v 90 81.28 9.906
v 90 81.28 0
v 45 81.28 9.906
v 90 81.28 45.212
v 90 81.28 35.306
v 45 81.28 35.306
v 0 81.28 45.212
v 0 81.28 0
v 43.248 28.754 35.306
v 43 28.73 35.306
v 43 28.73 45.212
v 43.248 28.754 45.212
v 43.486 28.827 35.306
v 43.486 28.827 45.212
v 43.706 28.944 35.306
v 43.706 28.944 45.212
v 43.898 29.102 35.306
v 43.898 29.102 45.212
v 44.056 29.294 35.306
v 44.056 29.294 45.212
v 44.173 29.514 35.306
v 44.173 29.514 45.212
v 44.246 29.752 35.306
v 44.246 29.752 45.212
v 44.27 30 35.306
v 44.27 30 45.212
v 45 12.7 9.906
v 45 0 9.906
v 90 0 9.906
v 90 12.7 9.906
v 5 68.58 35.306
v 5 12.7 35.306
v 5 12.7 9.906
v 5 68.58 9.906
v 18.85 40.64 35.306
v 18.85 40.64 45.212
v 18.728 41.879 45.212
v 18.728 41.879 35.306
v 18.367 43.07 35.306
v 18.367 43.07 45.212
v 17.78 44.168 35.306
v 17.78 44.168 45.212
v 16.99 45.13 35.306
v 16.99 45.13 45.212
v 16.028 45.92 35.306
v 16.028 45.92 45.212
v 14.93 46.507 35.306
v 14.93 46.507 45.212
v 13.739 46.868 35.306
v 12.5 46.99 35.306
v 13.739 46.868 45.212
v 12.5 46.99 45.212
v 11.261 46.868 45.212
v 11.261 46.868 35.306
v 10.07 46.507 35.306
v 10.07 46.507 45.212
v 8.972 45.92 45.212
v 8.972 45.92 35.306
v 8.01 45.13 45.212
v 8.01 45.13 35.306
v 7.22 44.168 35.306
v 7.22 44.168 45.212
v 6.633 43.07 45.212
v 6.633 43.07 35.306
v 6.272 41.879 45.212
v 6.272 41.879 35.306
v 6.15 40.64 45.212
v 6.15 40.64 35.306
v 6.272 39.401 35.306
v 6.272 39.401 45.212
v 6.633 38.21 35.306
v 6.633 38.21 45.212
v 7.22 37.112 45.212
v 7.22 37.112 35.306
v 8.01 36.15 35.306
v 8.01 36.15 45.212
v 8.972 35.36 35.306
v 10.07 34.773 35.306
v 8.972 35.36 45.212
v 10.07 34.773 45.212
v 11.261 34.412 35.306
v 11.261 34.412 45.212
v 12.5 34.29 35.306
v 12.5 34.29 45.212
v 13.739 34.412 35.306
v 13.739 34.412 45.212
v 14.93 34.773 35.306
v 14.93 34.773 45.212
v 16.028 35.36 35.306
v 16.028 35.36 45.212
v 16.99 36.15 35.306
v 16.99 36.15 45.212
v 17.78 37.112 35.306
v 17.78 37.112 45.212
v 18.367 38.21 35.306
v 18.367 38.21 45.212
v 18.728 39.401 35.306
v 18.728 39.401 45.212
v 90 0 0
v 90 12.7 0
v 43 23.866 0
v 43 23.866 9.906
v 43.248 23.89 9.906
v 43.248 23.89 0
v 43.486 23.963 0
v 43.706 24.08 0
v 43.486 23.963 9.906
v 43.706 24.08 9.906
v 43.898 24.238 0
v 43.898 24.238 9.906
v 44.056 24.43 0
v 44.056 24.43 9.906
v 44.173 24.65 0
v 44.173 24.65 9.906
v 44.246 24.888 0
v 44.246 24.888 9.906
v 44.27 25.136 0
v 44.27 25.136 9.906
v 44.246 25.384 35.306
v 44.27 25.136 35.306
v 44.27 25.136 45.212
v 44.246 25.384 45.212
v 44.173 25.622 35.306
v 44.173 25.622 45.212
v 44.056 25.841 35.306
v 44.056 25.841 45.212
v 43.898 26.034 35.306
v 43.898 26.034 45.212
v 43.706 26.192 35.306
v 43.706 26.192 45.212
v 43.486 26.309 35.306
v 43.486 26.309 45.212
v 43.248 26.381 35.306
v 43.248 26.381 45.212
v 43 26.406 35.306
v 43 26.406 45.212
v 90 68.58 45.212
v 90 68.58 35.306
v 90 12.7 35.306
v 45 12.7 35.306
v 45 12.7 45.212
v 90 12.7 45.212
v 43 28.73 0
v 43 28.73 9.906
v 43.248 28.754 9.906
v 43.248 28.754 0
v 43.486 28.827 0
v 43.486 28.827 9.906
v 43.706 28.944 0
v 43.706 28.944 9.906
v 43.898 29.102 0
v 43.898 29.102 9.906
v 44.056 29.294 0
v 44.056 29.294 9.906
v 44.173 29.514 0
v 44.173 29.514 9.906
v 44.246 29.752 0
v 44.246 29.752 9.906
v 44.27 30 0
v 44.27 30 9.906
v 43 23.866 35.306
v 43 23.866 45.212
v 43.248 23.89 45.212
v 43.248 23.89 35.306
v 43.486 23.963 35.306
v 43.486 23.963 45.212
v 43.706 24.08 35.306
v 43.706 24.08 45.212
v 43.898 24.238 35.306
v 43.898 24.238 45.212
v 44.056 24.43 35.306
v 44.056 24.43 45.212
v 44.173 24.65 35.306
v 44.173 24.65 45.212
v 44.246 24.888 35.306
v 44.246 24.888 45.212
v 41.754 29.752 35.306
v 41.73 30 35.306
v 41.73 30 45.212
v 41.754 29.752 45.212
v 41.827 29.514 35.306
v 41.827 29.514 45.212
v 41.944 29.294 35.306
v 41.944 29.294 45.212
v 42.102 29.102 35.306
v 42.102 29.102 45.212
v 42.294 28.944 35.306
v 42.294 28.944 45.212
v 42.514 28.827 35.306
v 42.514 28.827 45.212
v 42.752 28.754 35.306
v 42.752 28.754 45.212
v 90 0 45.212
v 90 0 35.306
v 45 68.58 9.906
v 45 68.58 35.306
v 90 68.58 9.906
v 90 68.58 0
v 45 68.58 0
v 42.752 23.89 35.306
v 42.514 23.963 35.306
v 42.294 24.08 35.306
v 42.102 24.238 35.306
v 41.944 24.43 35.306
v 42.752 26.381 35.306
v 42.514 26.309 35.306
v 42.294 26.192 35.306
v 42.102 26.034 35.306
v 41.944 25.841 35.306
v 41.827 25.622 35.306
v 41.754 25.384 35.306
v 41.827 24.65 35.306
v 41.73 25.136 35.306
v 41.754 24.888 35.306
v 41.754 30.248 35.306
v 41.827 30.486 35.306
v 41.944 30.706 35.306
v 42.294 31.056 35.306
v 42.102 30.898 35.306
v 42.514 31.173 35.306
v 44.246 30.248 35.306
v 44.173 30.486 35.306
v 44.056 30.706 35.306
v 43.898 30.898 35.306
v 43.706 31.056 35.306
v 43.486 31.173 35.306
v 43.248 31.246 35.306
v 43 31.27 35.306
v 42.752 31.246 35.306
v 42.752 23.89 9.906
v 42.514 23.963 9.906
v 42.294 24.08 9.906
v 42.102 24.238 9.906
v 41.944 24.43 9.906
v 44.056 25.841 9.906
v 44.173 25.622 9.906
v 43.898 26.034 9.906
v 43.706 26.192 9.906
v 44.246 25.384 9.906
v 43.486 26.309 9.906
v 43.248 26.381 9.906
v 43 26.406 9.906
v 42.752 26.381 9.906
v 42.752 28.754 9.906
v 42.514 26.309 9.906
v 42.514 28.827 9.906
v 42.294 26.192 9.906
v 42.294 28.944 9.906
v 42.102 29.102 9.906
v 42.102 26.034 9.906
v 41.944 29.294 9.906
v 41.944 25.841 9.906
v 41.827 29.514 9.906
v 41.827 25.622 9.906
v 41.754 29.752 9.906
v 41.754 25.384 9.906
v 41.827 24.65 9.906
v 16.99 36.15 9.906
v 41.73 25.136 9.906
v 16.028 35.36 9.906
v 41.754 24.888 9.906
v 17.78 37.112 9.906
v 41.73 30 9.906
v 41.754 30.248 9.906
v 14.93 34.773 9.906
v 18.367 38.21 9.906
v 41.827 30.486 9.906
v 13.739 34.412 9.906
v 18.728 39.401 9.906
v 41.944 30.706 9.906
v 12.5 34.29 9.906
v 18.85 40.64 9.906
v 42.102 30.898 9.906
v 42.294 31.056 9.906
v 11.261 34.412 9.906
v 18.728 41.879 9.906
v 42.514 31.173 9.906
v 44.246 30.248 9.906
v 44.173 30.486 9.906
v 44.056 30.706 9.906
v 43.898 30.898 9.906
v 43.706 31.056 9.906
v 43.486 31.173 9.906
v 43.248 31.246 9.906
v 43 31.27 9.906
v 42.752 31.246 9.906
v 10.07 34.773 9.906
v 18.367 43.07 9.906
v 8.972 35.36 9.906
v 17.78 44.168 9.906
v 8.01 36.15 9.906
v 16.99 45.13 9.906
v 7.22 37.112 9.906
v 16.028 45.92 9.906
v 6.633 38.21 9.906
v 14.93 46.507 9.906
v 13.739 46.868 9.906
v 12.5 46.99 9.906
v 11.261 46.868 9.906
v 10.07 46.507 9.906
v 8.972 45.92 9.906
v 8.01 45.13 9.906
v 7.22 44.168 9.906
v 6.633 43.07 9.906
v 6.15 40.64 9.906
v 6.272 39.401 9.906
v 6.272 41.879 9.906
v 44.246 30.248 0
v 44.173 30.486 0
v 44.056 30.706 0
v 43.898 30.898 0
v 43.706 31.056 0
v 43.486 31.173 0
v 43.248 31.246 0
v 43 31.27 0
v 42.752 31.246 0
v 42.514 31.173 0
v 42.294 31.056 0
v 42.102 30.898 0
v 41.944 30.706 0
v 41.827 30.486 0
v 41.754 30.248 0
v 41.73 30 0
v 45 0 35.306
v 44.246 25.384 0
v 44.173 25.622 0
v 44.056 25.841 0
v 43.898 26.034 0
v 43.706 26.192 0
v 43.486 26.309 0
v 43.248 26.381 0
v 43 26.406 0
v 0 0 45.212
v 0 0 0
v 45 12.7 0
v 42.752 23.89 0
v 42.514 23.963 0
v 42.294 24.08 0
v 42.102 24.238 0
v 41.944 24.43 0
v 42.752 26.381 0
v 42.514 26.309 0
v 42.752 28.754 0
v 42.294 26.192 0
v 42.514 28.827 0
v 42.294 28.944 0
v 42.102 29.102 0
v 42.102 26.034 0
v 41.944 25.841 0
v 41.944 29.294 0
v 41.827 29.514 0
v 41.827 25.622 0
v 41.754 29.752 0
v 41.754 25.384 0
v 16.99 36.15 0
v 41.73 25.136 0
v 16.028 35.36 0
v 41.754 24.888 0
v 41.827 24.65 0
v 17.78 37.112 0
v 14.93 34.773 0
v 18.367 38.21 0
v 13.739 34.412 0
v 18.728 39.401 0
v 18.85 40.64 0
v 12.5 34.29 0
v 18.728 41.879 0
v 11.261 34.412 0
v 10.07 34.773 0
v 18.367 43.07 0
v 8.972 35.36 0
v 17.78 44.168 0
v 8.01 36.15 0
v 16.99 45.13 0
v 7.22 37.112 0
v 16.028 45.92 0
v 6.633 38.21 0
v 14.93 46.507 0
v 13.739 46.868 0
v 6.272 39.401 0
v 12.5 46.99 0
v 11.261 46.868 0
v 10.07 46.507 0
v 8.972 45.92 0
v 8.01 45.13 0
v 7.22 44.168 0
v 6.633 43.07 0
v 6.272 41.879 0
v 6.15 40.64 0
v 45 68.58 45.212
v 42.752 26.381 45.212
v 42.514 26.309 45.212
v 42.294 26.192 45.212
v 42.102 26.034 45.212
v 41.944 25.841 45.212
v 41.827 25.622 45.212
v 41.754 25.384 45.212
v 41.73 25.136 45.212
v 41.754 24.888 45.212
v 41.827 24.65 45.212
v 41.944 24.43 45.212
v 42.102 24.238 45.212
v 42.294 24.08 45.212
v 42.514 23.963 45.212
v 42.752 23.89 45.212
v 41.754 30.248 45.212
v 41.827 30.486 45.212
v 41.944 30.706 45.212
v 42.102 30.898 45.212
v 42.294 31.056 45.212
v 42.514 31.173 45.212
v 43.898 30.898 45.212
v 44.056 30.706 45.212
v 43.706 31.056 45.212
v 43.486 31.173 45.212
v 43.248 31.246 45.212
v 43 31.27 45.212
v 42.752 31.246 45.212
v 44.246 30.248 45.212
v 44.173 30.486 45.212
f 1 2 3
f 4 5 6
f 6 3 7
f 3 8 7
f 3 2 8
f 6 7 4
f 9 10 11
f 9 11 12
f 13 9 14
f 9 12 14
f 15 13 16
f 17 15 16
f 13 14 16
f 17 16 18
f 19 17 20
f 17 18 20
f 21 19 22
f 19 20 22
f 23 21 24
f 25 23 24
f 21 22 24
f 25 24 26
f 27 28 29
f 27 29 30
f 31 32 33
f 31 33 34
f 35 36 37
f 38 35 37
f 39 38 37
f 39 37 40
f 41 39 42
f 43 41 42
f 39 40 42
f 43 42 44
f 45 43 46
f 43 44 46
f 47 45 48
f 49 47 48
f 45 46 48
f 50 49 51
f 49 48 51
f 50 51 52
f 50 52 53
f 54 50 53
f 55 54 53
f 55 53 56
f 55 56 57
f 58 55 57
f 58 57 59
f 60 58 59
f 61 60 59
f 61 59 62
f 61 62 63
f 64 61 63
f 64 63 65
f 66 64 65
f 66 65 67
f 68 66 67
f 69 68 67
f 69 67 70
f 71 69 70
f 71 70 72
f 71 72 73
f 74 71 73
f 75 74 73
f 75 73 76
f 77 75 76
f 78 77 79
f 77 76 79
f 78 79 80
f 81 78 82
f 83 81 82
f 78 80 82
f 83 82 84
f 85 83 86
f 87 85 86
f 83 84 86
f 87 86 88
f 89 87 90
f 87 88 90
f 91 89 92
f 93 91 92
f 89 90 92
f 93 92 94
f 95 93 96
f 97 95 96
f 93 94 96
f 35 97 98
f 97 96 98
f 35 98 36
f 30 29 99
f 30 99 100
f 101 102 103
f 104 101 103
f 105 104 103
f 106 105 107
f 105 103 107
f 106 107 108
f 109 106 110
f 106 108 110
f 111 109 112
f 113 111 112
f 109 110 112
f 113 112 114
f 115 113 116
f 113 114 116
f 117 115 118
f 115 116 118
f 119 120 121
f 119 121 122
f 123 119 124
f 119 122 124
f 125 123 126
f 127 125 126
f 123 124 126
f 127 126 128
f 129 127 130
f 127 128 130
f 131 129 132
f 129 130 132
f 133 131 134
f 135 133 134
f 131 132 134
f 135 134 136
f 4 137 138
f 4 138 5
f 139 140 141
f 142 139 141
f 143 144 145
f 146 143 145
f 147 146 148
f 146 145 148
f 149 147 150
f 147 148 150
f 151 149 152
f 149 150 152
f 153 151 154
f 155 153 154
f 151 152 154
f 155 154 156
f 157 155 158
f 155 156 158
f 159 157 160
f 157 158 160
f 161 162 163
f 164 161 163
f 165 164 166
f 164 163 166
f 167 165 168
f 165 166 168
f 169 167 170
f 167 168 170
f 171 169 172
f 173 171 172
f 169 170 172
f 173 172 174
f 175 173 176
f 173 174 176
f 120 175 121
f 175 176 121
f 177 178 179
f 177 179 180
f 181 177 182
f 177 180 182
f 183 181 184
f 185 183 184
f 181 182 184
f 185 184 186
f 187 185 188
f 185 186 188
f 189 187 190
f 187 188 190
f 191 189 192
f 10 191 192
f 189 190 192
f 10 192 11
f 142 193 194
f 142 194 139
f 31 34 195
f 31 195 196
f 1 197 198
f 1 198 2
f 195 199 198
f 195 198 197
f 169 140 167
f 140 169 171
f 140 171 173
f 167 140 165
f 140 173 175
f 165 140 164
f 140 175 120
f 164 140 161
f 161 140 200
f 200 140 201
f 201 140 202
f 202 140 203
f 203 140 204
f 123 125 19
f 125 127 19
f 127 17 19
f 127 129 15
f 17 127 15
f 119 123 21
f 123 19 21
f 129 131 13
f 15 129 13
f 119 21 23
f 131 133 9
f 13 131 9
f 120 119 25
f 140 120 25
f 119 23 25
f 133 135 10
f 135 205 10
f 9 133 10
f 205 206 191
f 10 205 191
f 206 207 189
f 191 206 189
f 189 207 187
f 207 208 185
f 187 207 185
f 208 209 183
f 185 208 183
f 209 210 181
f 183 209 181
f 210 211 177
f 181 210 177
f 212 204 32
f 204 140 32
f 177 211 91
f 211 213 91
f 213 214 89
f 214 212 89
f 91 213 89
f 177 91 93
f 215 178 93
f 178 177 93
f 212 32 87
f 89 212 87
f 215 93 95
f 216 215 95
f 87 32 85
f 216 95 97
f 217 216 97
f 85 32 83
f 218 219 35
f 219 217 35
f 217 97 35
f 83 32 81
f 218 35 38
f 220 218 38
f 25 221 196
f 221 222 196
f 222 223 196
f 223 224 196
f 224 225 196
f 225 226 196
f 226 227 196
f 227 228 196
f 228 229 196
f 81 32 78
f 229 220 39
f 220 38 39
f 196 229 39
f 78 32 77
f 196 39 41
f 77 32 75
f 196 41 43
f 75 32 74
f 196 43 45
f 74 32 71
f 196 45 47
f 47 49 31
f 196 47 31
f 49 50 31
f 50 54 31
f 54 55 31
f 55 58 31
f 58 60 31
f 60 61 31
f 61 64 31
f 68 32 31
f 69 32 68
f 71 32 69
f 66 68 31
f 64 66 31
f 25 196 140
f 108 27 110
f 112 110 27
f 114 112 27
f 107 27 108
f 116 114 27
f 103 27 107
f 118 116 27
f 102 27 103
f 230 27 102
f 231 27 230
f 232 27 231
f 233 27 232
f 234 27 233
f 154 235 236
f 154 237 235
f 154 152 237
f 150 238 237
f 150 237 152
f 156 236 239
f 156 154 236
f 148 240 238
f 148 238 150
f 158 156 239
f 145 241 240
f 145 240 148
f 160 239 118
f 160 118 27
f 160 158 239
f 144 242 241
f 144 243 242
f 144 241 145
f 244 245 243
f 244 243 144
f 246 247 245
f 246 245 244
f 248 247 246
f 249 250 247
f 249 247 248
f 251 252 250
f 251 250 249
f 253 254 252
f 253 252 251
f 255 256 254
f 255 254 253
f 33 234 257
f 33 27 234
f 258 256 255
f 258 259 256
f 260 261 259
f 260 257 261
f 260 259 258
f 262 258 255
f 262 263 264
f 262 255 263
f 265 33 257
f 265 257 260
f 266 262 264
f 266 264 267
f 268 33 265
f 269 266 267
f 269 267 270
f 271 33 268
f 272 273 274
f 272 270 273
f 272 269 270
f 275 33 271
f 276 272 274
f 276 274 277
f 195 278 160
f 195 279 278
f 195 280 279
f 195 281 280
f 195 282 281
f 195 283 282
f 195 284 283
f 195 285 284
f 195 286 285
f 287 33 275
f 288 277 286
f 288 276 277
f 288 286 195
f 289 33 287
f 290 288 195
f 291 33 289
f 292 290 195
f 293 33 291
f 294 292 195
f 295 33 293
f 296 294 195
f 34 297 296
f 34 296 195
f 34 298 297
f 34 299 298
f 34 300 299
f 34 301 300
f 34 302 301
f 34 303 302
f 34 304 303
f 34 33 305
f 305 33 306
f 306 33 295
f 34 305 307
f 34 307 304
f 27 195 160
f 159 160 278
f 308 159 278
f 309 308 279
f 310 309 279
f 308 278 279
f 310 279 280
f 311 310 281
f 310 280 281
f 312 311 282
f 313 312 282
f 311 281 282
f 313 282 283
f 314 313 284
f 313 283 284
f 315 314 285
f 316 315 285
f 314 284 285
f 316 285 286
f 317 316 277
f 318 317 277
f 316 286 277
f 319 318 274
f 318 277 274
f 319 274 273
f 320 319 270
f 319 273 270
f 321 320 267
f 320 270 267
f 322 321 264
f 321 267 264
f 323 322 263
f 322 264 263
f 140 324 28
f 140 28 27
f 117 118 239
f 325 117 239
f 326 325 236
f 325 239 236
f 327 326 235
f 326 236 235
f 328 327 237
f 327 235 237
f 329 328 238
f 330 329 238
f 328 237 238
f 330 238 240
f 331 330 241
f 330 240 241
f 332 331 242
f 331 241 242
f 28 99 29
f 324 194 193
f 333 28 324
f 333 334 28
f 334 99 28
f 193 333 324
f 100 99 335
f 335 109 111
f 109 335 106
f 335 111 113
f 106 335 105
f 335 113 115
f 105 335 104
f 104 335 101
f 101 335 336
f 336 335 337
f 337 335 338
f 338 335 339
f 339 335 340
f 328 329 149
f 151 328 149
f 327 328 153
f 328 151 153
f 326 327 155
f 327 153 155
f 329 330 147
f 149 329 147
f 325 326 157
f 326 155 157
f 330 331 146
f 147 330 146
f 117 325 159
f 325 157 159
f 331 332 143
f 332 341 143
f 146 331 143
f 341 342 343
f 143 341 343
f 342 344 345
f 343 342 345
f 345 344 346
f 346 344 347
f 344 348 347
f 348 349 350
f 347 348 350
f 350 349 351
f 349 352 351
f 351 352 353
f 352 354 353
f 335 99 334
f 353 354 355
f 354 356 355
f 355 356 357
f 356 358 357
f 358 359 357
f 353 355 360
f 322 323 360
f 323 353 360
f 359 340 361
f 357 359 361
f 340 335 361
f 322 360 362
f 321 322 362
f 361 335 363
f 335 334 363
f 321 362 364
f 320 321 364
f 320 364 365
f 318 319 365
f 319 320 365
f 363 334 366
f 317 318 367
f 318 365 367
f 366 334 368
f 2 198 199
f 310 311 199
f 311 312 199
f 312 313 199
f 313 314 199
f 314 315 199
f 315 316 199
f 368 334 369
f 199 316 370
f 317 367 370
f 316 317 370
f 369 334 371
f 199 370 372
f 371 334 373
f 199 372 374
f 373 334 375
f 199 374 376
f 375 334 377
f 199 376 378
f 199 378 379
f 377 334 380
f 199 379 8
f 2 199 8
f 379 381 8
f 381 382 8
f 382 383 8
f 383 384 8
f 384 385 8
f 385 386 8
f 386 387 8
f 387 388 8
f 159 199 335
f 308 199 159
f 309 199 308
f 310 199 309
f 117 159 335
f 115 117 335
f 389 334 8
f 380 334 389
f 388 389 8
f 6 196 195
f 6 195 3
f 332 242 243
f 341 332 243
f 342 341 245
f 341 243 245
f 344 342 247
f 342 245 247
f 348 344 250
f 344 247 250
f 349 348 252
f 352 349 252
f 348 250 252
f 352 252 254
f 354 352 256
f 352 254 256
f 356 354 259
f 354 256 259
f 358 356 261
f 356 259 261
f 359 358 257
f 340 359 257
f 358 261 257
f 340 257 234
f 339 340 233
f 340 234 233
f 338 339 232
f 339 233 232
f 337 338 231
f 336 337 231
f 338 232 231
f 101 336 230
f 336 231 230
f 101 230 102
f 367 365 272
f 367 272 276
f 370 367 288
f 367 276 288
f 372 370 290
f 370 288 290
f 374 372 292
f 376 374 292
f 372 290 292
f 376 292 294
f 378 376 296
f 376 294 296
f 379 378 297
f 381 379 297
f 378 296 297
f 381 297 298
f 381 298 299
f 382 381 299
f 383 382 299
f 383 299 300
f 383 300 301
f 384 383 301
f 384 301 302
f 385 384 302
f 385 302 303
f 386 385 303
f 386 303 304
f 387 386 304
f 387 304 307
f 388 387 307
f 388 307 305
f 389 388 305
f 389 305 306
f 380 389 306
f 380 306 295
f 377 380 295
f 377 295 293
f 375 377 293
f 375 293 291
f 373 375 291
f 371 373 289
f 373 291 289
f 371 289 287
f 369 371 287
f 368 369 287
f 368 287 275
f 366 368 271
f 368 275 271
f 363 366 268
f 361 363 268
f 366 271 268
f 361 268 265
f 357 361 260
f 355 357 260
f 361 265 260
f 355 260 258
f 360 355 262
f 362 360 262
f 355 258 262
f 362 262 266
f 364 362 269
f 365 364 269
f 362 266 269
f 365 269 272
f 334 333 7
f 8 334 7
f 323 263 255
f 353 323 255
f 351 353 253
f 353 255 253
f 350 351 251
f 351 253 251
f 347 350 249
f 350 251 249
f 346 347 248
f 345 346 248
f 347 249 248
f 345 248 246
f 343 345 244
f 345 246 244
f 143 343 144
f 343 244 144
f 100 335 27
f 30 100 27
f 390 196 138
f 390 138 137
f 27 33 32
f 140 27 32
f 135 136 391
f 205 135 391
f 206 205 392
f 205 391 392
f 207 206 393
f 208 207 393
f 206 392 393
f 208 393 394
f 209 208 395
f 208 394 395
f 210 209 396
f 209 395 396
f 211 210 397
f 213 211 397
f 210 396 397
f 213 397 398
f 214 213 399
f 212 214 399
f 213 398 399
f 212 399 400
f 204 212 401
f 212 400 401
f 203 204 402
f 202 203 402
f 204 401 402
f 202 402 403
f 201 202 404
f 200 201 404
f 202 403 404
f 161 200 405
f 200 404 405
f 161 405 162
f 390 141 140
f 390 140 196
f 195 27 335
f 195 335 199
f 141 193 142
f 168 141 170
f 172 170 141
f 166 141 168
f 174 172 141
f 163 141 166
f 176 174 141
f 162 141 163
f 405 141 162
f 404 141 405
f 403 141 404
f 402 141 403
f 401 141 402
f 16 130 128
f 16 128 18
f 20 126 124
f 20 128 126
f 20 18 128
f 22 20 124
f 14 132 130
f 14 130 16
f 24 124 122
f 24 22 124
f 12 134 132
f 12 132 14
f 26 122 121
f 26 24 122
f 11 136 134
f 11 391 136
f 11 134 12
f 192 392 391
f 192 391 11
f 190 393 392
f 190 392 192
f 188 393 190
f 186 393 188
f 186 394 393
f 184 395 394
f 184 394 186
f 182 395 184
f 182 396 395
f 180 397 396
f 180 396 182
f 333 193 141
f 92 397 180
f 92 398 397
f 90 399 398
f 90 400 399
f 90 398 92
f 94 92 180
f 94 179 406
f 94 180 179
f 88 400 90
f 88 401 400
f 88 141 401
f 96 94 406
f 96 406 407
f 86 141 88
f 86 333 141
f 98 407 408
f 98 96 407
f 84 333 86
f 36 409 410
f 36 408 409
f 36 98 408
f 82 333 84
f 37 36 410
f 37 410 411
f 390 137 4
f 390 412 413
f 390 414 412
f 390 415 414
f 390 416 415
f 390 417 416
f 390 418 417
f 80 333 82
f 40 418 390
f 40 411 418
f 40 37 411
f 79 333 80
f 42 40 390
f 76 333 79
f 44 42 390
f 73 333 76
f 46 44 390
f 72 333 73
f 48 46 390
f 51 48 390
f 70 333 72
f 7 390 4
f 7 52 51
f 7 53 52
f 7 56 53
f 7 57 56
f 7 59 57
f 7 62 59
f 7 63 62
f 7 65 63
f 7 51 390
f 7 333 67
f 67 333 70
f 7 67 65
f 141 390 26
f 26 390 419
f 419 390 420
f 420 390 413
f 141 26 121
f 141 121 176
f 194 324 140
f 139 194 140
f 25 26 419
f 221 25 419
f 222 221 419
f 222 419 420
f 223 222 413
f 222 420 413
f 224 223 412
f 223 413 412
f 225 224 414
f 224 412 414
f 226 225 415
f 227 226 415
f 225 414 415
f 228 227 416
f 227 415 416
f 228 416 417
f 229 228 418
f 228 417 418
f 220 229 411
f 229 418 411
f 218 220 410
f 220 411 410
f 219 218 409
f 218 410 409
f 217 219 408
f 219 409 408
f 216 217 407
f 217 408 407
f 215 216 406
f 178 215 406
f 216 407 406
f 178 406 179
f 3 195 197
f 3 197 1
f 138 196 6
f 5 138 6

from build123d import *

# Parameters (mm, degrees)
SKETCH1_W             = 12.7
SKETCH1_H             = 9.906
BOSS_EXTRUDE1_DEPTH   = 90
BOSS_EXTRUDE1_2_DEPTH = 90
BOSS_EXTRUDE1_3_DEPTH = 90
BOSS_EXTRUDE1_4_DEPTH = 90
SKETCH1_4_W           = 55.88
SKETCH1_4_H           = 9.906
SKETCH1_4_W_2         = 12.7
SKETCH1_4_H_2         = 25.4
BOSS_EXTRUDE2_DEPTH   = 45
SKETCH1_5_W           = 55.88
SKETCH1_5_H           = 25.4
BOSS_EXTRUDE3_DEPTH   = 5
SKETCH3_R             = 1.27
SKETCH3_R_2           = 6.35
CUT_EXTRUDE1_DEPTH    = 130.423967425


with BuildPart() as part:
    # Sketch1 → Boss-Extrude1 (new body)
    with BuildSketch(Plane.YZ):
        with Locations((6.35, 40.259)):
            Rectangle(SKETCH1_W, SKETCH1_H)
    extrude(amount=BOSS_EXTRUDE1_DEPTH)



with BuildPart() as body_2:
    # Sketch1 → Boss-Extrude1 2 (new body)
    with BuildSketch(Plane.YZ):
        with Locations((74.93, 40.259)):
            Rectangle(SKETCH1_W, SKETCH1_H)
    extrude(amount=BOSS_EXTRUDE1_2_DEPTH)


with BuildPart() as body_3:
    # Sketch1 → Boss-Extrude1 3 (new body)
    with BuildSketch(Plane.YZ):
        with Locations((6.35, 4.953)):
            Rectangle(SKETCH1_W, SKETCH1_H)
    extrude(amount=BOSS_EXTRUDE1_3_DEPTH)


with BuildPart() as body_4:
    # Sketch1 → Boss-Extrude1 4 (new body)
    with BuildSketch(Plane.YZ):
        with Locations((74.93, 4.953)):
            Rectangle(SKETCH1_W, SKETCH1_H)
    extrude(amount=BOSS_EXTRUDE1_4_DEPTH)


with BuildPart() as part_1:
    add(part.part)

    add(body_2.part)  # Boss-Extrude2 merges body 2

    add(body_3.part)  # Boss-Extrude2 merges body 3

    add(body_4.part)  # Boss-Extrude2 merges body 4
    # Sketch1<4> → Boss-Extrude2 (add)
    with BuildSketch(Plane.YZ):
        with Locations((40.64, 40.259)):
            Rectangle(SKETCH1_4_W, SKETCH1_4_H)
        with Locations((6.35, 22.606)):
            Rectangle(SKETCH1_4_W_2, SKETCH1_4_H_2)
        with Locations((40.64, 4.953)):
            Rectangle(SKETCH1_4_W, SKETCH1_4_H)
        with Locations((74.93, 22.606)):
            Rectangle(SKETCH1_4_W_2, SKETCH1_4_H_2)
    extrude(amount=BOSS_EXTRUDE2_DEPTH)

    # Sketch1<5> → Boss-Extrude3 (add)
    with BuildSketch(Plane.YZ):
        with Locations((40.64, 22.606)):
            Rectangle(SKETCH1_5_W, SKETCH1_5_H)
    extrude(amount=BOSS_EXTRUDE3_DEPTH)

    # Sketch3 → Cut-Extrude1 (cut, through all)
    with BuildSketch(Plane.XY.offset(45.212)):
        with Locations((43, 30)):
            Circle(SKETCH3_R)
        with Locations((43, 25.1359)):
            Circle(SKETCH3_R)
        with Locations((12.5, 40.64)):
            Circle(SKETCH3_R_2)
    extrude(amount=-CUT_EXTRUDE1_DEPTH, mode=Mode.SUBTRACT)


solid = part_1.part
